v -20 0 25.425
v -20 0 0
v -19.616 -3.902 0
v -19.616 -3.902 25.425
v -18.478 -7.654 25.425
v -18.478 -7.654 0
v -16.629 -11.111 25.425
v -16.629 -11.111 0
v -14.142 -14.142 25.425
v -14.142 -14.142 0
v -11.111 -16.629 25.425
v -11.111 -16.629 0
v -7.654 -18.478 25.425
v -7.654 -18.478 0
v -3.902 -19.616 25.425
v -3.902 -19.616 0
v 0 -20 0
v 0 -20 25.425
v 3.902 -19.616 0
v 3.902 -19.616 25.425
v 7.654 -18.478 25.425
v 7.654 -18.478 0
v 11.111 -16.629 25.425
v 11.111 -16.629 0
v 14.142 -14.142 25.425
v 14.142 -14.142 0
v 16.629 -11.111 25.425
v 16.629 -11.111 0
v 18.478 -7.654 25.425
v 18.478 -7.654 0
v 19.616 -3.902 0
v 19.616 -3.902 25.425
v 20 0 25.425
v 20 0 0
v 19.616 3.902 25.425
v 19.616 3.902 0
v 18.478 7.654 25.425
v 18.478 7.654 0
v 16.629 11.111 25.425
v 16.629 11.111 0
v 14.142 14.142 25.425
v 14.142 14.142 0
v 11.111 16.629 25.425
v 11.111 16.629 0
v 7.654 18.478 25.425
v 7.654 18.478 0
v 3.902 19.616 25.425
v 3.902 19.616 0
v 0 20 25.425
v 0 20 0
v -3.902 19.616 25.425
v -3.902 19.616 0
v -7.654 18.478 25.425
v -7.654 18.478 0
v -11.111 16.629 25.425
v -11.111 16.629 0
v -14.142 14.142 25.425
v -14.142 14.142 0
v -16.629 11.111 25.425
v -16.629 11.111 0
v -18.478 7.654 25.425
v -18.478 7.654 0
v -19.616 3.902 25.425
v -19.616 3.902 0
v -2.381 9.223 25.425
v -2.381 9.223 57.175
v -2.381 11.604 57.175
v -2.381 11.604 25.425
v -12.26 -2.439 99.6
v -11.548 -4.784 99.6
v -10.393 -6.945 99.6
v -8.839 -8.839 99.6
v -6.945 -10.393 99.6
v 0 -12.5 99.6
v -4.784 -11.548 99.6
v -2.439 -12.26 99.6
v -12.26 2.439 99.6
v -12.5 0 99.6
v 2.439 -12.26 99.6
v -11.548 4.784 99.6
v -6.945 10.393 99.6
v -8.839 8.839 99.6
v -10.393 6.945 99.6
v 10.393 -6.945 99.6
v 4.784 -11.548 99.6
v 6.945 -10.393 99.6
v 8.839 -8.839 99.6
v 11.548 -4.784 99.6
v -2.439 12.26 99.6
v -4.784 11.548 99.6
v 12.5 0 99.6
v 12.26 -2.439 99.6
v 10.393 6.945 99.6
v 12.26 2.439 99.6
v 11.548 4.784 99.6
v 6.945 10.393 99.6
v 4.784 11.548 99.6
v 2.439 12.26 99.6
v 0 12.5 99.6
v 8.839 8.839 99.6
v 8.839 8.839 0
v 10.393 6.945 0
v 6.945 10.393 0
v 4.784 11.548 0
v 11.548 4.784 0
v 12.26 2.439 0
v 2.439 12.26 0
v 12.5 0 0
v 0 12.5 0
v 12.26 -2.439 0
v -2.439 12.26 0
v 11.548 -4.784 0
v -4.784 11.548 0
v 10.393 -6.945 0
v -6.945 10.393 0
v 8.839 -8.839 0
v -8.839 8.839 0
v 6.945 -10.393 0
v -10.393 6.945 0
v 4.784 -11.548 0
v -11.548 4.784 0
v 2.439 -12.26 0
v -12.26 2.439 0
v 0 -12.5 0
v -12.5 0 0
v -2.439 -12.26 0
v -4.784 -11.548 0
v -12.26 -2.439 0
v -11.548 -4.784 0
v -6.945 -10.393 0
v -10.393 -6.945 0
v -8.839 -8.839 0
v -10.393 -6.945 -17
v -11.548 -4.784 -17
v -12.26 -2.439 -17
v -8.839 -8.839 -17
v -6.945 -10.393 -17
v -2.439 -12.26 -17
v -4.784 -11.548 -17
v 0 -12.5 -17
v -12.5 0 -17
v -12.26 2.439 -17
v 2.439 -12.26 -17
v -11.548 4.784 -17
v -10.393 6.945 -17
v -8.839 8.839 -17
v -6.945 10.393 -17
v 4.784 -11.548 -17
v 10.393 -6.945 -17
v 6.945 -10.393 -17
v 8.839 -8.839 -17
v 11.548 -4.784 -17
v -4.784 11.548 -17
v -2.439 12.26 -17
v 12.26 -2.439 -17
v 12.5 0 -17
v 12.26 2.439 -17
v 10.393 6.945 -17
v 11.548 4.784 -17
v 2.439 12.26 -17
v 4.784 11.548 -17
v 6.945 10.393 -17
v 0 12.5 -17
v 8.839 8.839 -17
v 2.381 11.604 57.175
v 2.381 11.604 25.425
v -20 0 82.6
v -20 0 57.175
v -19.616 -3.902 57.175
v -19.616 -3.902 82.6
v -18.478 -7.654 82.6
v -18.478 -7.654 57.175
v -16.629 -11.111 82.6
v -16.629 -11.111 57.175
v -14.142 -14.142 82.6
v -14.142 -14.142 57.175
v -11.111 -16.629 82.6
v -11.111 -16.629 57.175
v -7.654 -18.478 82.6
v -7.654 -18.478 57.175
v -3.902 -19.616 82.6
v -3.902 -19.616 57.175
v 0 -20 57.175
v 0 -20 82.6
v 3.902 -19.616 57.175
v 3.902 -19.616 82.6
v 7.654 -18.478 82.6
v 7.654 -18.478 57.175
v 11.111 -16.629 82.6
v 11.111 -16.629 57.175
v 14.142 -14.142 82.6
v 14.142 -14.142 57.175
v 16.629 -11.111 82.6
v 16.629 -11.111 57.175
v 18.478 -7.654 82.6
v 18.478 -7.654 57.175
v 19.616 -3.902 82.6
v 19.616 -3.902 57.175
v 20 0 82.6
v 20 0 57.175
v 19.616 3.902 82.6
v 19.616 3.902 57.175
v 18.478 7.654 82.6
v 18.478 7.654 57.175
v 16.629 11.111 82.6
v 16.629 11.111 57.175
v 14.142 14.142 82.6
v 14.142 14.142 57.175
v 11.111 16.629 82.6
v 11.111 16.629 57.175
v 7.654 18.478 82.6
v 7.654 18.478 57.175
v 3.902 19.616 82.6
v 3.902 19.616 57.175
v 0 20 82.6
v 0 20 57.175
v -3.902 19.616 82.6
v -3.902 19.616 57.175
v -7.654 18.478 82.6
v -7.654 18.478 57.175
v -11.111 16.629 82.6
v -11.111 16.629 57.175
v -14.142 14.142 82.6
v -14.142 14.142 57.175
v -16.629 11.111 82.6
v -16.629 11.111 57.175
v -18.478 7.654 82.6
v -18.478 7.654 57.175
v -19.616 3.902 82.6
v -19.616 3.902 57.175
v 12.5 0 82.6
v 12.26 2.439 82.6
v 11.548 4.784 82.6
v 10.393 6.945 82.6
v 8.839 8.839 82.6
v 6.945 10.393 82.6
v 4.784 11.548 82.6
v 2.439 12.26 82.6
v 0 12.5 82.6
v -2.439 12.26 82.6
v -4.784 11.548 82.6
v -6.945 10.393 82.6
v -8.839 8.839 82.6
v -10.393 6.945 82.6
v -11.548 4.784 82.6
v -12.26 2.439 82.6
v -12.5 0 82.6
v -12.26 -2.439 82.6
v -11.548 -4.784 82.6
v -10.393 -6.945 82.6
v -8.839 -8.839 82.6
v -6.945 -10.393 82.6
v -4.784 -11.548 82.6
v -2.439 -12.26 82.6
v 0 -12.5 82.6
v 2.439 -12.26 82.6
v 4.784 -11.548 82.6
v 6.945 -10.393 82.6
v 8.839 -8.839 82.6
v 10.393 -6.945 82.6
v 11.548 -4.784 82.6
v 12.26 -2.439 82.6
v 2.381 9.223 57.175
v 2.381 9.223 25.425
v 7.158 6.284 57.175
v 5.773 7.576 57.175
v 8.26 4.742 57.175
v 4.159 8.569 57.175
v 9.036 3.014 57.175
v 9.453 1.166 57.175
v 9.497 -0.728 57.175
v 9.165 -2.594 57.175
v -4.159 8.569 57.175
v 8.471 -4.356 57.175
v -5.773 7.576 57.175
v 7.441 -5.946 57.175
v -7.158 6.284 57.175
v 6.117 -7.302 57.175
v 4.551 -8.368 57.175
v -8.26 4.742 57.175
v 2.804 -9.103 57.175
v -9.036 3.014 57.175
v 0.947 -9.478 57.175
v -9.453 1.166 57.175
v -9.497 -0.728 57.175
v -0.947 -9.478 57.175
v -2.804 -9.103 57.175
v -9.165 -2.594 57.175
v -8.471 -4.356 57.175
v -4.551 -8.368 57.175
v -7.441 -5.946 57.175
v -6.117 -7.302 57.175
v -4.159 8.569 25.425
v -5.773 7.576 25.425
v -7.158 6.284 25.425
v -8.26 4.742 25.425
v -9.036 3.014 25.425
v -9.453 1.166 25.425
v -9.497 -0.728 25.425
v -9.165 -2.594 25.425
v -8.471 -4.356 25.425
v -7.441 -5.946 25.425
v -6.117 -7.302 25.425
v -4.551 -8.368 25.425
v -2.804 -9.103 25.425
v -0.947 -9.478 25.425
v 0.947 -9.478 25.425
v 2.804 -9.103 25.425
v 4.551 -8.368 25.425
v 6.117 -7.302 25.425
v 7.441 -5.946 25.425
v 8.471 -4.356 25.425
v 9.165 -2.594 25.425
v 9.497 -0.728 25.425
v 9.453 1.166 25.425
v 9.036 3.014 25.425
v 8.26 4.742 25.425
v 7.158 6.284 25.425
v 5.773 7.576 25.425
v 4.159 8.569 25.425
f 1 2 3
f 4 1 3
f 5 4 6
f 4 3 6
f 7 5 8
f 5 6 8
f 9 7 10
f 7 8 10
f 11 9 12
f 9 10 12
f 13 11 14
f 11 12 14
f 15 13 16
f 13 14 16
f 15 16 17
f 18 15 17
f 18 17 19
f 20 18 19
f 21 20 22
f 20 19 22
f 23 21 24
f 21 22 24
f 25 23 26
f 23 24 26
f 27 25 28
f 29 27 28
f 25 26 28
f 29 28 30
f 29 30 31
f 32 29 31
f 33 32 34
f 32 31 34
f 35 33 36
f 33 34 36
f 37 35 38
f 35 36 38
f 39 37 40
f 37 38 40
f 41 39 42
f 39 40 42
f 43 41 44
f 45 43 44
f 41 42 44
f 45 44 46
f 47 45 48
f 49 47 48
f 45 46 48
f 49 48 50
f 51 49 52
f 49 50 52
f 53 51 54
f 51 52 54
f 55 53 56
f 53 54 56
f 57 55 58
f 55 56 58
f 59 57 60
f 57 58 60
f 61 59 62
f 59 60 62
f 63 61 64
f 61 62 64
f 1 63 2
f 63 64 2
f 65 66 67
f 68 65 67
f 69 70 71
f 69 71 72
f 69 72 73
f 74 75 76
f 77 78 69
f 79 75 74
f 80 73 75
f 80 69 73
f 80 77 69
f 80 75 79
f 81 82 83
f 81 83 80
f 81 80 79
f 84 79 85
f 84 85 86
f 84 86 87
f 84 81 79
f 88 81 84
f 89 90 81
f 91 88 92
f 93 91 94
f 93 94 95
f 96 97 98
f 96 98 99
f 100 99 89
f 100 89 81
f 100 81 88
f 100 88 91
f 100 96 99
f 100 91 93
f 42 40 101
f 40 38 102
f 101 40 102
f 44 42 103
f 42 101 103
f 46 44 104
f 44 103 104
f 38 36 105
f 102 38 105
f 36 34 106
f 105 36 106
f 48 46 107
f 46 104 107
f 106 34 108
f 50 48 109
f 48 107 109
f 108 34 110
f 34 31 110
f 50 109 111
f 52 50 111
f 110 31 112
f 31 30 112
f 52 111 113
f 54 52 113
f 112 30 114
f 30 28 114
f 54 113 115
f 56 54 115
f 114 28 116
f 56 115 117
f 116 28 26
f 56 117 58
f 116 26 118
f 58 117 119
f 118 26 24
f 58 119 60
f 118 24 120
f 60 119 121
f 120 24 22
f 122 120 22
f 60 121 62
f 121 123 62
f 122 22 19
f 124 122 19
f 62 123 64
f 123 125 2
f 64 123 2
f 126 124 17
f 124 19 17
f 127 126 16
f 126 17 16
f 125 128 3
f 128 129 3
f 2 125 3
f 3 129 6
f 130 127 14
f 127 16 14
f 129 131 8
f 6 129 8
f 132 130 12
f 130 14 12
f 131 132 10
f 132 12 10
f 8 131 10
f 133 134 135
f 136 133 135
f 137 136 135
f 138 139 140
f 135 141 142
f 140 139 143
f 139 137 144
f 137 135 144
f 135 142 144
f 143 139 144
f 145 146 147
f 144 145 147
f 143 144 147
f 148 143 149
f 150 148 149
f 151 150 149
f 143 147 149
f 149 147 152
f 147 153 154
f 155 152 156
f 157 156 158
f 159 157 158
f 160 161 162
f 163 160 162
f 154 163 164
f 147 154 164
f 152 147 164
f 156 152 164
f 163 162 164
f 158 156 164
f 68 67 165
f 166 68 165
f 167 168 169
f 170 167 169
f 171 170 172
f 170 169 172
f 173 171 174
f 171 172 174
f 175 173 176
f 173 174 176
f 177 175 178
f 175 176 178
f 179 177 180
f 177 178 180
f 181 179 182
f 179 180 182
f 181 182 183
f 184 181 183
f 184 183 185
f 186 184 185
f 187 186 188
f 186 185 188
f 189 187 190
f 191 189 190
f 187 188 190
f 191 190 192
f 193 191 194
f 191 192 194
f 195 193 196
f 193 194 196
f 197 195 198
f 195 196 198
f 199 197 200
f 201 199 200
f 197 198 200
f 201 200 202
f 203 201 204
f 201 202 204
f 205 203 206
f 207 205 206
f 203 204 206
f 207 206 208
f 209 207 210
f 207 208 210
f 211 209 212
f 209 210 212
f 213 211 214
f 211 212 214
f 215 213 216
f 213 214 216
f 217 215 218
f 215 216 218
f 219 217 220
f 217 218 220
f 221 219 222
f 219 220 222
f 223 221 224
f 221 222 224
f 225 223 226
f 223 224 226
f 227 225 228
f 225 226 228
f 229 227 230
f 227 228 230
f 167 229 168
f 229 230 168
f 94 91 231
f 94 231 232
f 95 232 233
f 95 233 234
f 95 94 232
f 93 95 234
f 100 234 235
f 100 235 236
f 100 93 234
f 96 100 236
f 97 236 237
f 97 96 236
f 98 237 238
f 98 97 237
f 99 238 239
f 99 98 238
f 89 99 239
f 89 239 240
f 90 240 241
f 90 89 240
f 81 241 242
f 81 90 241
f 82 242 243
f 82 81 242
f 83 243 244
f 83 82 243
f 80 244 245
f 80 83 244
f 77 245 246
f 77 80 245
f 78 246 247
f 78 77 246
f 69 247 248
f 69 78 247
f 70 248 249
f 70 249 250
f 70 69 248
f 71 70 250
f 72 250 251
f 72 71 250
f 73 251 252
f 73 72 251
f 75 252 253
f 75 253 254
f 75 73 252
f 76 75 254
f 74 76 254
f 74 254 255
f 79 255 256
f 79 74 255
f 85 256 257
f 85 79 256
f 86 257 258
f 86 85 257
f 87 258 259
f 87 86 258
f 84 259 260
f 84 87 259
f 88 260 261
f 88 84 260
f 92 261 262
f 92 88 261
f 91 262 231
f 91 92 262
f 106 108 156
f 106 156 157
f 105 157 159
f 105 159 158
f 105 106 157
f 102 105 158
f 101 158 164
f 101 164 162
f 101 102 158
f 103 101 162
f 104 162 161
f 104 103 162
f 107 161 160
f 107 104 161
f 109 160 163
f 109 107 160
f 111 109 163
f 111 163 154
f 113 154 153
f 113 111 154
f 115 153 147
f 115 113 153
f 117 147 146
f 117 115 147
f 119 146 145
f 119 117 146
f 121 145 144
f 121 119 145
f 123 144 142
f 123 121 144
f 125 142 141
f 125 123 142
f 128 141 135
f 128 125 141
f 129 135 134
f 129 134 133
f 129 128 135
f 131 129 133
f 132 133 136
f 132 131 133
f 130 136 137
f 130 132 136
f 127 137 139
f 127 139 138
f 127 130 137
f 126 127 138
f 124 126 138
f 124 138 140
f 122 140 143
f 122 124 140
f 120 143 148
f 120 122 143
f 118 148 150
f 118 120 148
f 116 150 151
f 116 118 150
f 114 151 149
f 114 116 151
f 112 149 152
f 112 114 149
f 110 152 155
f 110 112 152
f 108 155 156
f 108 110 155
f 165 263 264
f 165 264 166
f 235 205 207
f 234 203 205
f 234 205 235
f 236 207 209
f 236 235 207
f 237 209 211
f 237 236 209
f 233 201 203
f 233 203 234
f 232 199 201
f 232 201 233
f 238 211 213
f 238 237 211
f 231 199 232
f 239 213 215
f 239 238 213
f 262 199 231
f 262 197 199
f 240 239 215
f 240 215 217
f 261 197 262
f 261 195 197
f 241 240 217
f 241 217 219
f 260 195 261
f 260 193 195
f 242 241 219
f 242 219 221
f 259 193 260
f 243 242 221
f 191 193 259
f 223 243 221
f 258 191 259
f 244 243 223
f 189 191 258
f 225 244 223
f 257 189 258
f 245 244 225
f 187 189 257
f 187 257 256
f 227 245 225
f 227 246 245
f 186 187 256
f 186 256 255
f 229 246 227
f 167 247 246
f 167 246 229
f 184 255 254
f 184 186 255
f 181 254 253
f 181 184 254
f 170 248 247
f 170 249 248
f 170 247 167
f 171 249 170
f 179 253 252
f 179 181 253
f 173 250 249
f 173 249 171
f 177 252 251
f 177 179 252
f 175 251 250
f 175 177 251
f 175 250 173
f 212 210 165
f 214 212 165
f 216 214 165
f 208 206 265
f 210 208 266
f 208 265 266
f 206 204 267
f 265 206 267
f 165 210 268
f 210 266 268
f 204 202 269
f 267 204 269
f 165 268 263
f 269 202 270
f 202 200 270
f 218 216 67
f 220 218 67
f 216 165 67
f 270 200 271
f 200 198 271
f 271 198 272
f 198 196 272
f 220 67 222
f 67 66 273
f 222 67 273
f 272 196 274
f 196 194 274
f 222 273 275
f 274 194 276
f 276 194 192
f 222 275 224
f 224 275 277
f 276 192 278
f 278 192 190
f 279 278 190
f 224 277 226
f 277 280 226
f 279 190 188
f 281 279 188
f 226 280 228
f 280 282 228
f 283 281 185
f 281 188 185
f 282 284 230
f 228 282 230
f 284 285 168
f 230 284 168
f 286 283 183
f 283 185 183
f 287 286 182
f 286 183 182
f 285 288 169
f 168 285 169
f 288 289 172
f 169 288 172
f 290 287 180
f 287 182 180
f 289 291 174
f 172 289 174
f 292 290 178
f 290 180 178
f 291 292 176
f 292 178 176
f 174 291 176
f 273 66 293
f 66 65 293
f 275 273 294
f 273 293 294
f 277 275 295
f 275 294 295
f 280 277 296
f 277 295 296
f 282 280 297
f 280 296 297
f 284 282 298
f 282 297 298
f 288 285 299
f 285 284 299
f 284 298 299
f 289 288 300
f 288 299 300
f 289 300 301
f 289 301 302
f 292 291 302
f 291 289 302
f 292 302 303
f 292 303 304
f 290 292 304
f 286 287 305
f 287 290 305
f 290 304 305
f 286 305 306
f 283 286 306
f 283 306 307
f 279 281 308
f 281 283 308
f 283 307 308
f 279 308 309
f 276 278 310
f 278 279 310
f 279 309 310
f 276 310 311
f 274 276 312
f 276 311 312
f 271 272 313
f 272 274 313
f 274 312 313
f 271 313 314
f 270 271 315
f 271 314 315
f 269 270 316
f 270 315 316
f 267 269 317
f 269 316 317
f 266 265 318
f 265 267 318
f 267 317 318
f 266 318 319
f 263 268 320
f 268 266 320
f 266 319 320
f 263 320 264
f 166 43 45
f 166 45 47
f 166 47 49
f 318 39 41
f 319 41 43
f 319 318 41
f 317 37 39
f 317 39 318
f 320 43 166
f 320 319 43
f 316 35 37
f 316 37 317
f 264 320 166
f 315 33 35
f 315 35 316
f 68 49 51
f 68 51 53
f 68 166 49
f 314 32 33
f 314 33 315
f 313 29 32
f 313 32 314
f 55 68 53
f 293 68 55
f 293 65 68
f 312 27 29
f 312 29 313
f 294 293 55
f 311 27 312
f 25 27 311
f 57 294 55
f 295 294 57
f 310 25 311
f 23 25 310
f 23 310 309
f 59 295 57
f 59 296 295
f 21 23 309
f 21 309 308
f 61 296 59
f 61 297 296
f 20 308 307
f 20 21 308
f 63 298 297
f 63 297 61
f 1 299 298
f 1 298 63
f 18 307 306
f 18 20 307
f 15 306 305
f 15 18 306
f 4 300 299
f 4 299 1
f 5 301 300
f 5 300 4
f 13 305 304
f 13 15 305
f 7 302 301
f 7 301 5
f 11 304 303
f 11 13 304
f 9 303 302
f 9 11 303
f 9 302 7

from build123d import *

# Parameters (mm, degrees)
SKETCH1_R           = 12.5
BOSS_EXTRUDE1_DEPTH = 17
SKETCH2_R           = 20
BOSS_EXTRUDE2_DEPTH = 25.425
SKETCH3_R           = 9.525
BOSS_EXTRUDE3_DEPTH = 31.75
SKETCH9_W           = 4.7625
SKETCH9_H           = 2.38125
BOSS_EXTRUDE6_DEPTH = 31.75
SKETCH4_R           = 20
BOSS_EXTRUDE4_DEPTH = 25.425
BOSS_EXTRUDE5_START = 17
SKETCH5_R           = 12.5
BOSS_EXTRUDE5_DEPTH = 17


with BuildPart() as part:
    # Sketch1 → Boss-Extrude1 (new body)
    with BuildSketch(Plane.XY):
        Circle(SKETCH1_R)
    extrude(amount=-BOSS_EXTRUDE1_DEPTH)

    # Sketch2 → Boss-Extrude2 (add)
    with BuildSketch(Plane.XY):
        with Locations(Location((0, 0, 0), (0, 0, 180))):
            Circle(SKETCH2_R)
    extrude(amount=BOSS_EXTRUDE2_DEPTH)

    # Sketch3 → Boss-Extrude3 (add)
    with BuildSketch(Plane.XY.offset(25.425)):
        Circle(SKETCH3_R)
    extrude(amount=BOSS_EXTRUDE3_DEPTH)

    # Sketch9 → Boss-Extrude6 (add)
    with BuildSketch(Plane.XY.offset(57.175)):
        with Locations((0, 10.413166593)):
            Rectangle(SKETCH9_W, SKETCH9_H)
    extrude(amount=-BOSS_EXTRUDE6_DEPTH)

    # Sketch4 → Boss-Extrude4 (add)
    with BuildSketch(Plane.XY.offset(57.175)):
        with Locations(Location((0, 0, 0), (0, 0, 180))):
            Circle(SKETCH4_R)
    extrude(amount=BOSS_EXTRUDE4_DEPTH)

    # Sketch5 → Boss-Extrude5 (add)
    with BuildSketch(Plane.XY.offset(82.6).offset(BOSS_EXTRUDE5_START)):
        Circle(SKETCH5_R)
    extrude(amount=-BOSS_EXTRUDE5_DEPTH)


solid = part.part
